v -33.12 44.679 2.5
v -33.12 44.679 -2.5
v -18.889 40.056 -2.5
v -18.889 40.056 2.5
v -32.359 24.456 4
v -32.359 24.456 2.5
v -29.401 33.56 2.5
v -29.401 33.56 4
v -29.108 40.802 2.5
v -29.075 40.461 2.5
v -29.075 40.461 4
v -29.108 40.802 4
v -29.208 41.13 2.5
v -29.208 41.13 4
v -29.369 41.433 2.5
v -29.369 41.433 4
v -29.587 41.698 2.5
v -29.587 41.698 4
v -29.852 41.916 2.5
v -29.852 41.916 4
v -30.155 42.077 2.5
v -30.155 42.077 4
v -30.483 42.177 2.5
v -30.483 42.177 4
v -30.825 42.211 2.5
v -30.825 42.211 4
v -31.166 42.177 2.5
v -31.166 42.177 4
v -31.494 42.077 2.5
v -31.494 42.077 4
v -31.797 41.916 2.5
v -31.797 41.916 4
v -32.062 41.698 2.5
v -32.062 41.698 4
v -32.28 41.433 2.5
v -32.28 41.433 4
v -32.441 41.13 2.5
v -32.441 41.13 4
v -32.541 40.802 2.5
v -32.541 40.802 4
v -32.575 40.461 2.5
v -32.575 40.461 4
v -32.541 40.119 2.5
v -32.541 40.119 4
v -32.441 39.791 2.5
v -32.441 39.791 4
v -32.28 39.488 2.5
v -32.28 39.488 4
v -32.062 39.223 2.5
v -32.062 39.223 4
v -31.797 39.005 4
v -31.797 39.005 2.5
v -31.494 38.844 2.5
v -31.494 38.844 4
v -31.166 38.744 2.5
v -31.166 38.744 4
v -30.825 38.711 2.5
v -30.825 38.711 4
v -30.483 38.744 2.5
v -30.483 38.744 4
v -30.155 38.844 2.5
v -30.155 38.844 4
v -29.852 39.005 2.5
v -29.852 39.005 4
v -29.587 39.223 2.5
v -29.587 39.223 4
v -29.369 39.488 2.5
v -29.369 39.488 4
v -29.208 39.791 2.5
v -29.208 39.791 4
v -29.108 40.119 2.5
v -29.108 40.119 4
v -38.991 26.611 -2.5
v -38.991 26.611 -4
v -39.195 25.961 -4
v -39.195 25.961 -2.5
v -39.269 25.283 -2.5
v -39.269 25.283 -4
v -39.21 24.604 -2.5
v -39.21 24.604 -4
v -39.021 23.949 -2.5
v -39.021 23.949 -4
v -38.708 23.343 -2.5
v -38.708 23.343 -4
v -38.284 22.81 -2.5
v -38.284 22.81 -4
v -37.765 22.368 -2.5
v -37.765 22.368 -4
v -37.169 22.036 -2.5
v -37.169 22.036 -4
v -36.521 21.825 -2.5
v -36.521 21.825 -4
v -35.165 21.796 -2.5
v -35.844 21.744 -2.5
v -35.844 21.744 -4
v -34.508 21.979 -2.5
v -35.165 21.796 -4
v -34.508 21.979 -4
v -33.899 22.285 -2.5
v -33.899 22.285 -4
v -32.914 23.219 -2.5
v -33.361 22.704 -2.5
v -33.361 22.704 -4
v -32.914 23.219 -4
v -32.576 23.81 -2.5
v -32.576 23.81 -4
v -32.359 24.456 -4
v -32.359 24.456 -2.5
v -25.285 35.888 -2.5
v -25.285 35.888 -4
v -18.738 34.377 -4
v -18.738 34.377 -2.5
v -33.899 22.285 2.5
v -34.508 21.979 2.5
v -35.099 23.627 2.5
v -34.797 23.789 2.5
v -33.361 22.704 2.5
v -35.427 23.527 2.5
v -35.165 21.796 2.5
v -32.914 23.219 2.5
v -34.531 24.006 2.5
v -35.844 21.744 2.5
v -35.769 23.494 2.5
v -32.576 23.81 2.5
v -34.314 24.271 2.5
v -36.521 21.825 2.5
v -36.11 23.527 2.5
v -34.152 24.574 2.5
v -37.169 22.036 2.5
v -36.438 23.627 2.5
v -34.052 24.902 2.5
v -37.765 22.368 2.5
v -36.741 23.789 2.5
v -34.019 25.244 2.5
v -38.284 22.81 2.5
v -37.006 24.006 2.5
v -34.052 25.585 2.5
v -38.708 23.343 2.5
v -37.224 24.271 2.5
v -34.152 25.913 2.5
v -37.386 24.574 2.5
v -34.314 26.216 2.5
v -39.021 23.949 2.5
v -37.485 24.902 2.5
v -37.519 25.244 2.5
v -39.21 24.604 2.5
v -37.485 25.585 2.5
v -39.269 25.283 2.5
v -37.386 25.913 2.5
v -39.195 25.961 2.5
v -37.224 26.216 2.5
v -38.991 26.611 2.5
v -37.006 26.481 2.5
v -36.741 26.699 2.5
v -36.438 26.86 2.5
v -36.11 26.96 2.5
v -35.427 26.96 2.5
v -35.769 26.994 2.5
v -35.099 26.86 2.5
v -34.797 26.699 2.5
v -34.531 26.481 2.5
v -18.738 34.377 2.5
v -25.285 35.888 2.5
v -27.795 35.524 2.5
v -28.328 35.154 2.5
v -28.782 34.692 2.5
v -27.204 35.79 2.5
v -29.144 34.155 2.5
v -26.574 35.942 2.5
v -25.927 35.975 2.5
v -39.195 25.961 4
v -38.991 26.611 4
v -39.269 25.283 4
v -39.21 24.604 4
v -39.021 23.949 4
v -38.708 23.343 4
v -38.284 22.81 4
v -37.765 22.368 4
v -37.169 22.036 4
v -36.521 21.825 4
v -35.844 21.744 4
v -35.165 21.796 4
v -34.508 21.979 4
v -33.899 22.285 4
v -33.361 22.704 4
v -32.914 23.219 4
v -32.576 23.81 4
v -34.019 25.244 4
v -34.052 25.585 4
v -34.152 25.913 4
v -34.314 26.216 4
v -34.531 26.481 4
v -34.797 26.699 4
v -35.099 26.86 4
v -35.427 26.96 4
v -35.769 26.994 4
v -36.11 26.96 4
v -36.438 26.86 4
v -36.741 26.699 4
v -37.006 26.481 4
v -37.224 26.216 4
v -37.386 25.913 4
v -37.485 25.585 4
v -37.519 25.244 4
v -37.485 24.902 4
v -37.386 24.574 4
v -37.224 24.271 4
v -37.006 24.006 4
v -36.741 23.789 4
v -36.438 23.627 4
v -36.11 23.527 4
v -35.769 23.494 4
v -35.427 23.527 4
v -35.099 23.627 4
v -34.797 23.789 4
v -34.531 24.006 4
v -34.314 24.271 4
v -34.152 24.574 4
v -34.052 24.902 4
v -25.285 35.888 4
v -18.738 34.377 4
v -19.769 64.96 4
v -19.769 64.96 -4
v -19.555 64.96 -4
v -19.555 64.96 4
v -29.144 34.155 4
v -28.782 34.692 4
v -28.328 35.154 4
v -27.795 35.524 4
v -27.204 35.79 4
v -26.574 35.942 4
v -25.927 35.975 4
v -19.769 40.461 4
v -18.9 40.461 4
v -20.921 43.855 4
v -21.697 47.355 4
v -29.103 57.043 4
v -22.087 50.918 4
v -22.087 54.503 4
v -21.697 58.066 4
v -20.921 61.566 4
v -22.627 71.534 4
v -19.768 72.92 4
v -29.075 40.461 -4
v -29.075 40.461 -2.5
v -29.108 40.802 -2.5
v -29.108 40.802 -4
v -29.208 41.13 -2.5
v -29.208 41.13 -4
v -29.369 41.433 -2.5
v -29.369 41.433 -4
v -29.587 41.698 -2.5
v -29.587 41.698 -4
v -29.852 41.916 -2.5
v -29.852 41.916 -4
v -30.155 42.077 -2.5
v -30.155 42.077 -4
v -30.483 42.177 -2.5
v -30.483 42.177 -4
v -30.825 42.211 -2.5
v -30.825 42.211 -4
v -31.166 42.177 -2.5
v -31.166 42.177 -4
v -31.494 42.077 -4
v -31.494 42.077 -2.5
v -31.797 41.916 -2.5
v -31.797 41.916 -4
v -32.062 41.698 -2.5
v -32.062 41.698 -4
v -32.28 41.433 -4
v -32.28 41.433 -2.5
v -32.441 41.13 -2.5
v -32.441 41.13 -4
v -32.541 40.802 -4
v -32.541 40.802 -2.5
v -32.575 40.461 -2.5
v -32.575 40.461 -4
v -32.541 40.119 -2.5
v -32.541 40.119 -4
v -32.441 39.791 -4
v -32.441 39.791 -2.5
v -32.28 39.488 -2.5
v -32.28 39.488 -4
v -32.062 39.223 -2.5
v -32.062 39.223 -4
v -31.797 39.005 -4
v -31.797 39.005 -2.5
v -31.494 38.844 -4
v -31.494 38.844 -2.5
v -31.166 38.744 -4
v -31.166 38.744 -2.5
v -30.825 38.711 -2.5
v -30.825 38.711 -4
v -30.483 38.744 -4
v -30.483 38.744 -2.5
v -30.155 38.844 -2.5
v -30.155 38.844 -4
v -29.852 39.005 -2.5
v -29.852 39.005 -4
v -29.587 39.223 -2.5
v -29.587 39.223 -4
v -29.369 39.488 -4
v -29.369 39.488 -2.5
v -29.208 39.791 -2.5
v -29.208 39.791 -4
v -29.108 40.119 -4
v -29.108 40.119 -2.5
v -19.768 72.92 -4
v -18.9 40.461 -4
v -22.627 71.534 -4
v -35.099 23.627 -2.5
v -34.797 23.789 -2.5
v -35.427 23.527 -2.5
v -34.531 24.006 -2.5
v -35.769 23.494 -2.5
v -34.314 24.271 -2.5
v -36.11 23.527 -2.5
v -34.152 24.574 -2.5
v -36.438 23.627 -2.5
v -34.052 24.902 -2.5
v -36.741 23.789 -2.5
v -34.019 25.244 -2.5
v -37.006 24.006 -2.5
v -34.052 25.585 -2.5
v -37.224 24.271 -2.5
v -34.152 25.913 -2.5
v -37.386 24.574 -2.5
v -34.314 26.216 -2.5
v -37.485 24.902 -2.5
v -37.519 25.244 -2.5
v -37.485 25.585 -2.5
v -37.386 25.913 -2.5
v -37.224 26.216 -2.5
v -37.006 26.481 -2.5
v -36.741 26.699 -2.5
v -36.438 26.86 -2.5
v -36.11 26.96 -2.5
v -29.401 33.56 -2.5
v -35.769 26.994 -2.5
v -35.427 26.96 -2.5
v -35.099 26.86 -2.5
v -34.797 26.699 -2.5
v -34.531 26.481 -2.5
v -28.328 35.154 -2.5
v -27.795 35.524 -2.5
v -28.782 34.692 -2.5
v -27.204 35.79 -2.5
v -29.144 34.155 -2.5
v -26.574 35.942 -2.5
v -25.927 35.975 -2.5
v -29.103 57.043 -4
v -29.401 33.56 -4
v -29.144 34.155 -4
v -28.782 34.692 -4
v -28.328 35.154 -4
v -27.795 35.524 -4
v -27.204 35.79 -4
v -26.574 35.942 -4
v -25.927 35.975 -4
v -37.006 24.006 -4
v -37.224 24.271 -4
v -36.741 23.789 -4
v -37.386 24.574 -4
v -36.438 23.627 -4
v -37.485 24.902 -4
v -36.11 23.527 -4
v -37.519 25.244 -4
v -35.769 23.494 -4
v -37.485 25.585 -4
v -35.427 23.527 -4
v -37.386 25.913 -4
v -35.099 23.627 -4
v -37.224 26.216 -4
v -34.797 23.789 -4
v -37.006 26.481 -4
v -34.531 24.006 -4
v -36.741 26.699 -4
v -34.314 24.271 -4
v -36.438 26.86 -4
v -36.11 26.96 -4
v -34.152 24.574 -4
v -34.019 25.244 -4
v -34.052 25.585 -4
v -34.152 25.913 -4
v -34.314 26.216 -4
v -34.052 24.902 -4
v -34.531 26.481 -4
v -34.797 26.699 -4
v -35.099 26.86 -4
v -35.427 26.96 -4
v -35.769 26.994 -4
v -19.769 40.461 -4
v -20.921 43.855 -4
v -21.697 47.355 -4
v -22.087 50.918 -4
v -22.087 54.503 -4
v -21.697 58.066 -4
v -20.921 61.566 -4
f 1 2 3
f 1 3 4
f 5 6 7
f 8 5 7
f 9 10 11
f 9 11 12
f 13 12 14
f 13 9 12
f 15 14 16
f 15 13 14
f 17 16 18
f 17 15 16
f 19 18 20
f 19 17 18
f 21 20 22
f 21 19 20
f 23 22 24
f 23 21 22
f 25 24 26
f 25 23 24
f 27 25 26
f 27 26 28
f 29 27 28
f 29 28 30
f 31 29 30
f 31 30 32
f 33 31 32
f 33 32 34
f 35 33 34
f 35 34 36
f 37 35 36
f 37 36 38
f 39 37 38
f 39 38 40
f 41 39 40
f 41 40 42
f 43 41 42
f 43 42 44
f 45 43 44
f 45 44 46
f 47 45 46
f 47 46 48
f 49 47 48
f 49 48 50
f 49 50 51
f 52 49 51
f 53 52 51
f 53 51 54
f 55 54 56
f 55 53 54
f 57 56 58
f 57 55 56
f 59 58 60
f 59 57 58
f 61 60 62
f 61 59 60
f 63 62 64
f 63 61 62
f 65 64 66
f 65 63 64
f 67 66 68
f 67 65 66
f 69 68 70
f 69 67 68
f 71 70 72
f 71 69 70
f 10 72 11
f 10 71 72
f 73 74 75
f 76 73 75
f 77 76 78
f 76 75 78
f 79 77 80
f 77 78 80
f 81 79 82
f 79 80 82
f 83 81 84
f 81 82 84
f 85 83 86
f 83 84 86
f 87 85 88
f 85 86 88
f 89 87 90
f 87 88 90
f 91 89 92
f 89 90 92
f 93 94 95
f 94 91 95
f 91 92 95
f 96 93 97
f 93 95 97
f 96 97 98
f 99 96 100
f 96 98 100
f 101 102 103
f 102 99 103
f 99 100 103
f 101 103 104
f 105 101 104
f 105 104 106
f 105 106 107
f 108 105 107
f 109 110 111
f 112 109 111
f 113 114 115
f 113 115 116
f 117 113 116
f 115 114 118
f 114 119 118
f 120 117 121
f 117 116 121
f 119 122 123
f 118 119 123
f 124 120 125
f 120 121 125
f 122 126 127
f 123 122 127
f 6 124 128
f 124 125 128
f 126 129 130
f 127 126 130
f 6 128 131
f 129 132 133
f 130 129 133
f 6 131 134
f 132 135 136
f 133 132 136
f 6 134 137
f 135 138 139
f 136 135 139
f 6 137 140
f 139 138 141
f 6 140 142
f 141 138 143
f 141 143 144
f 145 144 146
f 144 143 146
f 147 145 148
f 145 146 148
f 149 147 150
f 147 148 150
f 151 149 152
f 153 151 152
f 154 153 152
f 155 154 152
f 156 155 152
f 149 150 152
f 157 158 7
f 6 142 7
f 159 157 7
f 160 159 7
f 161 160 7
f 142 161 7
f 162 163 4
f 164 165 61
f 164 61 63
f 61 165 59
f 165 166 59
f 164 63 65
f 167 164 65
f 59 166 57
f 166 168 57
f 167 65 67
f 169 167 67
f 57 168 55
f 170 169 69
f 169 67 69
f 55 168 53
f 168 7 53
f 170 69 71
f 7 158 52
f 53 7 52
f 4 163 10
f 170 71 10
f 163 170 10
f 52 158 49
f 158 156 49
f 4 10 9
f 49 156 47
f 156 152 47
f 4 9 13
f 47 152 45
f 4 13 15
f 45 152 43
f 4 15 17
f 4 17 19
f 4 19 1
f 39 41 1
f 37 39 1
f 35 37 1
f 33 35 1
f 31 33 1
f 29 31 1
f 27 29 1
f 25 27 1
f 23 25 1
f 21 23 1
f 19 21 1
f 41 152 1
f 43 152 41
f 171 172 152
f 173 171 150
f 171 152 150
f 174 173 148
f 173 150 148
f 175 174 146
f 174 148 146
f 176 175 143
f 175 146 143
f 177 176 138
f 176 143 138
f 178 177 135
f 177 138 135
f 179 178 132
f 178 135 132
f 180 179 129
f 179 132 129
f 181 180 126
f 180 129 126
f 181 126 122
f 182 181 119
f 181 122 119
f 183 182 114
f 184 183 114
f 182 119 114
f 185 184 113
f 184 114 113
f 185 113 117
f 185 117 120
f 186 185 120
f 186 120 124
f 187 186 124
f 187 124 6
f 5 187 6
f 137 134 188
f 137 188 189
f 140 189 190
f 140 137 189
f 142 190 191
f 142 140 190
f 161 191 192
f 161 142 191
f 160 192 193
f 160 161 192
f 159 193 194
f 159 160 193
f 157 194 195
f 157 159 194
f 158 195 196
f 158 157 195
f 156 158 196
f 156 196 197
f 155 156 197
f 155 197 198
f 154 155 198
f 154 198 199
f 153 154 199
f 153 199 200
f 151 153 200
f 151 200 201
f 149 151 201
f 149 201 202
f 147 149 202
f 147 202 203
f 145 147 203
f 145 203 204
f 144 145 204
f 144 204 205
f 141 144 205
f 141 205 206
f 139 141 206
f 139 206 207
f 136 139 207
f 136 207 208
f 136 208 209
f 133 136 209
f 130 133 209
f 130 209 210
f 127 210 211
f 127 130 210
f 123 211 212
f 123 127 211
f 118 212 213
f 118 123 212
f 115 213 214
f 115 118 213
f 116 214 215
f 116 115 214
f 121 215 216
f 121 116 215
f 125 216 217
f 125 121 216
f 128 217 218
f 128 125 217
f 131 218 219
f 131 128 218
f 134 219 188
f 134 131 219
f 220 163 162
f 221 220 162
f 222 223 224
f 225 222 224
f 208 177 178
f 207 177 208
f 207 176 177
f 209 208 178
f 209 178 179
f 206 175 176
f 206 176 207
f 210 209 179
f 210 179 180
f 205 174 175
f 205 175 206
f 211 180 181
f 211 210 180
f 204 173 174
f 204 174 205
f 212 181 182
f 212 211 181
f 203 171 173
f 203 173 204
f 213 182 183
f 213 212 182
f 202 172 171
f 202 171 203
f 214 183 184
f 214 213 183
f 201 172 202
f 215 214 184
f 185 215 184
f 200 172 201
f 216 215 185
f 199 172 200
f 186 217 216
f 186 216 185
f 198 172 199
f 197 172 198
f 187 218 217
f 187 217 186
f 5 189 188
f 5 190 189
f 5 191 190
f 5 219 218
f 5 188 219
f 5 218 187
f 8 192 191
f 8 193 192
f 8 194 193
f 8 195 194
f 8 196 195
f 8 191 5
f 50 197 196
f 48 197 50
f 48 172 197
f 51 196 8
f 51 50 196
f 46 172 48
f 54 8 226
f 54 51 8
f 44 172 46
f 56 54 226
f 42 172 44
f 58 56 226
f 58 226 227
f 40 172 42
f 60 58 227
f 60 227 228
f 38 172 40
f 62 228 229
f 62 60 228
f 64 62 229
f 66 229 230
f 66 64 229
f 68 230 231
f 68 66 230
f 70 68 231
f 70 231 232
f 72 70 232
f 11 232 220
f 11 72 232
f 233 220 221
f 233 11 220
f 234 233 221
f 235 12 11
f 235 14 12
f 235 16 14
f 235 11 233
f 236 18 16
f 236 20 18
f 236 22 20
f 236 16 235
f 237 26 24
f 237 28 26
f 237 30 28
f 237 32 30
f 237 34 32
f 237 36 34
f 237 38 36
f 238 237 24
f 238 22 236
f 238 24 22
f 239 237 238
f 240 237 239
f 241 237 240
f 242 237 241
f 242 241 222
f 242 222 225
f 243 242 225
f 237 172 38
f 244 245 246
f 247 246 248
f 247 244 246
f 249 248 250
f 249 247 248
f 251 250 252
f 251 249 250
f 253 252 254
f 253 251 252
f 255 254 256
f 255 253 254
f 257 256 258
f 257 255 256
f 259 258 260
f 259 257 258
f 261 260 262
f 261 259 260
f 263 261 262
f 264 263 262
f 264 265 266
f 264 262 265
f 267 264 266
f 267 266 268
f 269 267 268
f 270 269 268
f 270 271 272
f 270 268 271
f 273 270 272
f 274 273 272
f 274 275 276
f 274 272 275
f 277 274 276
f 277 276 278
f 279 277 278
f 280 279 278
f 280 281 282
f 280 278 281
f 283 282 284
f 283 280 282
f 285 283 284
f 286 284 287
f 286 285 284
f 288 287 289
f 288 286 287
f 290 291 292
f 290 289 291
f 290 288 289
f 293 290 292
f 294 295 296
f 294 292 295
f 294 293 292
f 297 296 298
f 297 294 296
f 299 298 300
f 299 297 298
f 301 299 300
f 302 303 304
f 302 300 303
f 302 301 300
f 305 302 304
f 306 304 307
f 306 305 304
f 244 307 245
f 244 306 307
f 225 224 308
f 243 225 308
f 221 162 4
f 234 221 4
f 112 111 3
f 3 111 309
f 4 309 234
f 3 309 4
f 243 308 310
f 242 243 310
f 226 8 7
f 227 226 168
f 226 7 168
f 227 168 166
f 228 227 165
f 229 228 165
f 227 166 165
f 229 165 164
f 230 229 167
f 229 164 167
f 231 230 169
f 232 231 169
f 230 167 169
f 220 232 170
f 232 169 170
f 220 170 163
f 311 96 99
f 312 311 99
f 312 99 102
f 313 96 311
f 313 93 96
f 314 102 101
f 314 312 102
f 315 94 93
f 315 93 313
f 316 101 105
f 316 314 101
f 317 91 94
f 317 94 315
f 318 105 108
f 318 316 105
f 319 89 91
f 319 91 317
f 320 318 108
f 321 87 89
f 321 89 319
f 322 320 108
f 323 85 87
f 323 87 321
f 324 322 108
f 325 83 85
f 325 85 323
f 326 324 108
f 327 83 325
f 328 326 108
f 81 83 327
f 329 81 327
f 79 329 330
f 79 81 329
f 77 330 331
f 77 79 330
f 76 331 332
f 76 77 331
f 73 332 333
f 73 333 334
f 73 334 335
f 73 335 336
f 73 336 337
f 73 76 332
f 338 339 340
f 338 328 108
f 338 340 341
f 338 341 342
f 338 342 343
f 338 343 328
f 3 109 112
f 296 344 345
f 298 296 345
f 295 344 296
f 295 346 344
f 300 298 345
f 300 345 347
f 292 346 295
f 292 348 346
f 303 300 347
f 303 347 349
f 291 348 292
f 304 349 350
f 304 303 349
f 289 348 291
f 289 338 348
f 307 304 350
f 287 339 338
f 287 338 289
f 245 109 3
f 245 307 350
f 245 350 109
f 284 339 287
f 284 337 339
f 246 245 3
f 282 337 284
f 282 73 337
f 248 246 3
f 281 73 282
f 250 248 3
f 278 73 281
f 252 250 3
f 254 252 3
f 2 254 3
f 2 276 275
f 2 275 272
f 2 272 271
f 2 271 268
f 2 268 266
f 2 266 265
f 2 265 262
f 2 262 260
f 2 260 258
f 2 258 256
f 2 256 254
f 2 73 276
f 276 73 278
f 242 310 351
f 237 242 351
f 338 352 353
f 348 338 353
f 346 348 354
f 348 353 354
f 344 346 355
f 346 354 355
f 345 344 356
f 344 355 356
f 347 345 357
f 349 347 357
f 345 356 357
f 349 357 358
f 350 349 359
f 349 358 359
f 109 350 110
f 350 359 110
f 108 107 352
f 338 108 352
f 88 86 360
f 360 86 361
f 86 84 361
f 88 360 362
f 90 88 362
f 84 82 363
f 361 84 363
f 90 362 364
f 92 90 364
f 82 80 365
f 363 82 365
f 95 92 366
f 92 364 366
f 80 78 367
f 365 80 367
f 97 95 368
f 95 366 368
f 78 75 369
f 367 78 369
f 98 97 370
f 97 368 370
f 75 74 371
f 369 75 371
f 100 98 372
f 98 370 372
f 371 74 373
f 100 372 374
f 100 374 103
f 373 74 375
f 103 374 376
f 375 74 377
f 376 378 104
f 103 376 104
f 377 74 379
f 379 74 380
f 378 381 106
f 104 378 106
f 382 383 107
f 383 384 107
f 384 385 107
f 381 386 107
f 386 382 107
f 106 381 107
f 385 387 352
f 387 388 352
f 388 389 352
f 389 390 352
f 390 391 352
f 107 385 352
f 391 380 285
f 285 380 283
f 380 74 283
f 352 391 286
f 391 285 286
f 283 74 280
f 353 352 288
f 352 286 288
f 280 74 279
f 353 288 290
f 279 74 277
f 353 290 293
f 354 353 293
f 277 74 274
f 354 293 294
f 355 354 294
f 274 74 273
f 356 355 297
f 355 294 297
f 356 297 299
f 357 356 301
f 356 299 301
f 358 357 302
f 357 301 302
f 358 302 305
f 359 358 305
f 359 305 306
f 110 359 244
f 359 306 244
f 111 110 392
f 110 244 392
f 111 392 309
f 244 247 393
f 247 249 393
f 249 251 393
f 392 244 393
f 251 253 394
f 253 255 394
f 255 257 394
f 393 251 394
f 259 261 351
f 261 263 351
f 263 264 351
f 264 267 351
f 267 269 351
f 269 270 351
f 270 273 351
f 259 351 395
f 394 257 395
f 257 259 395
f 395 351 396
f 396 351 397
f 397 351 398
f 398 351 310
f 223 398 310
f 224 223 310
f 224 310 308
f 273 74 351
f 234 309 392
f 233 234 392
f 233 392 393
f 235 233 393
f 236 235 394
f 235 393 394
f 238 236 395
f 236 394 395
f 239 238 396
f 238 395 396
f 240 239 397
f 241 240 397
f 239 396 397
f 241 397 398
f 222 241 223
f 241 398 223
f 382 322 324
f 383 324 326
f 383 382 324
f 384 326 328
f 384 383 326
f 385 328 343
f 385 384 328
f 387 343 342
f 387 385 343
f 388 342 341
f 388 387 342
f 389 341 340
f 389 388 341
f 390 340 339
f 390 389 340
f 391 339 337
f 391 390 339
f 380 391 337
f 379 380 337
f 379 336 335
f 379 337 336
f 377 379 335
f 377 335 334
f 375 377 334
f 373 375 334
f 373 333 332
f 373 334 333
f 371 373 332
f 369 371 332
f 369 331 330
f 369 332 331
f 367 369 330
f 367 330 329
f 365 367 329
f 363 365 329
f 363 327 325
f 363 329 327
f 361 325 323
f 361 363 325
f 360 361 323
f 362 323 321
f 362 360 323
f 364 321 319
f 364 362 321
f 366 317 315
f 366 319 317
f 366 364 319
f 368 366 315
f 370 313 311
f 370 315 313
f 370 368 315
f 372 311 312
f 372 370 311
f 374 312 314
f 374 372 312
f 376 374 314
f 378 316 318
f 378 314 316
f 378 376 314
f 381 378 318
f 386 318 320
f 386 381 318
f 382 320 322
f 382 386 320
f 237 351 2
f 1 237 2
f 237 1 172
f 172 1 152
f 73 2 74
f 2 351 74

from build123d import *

# Parameters (mm, degrees)
ESTRUSIONE_ESTRUSIONE1_START     = -4
ESTRUSIONE_ESTRUSIONE1_OUTLINE_R = 1.75
ESTRUSIONE_ESTRUSIONE1_DEPTH     = 8
SCHIZZO2_W                       = 5
SCHIZZO2_H                       = 30
TAGLIO_ESTRUSIONE1_DEPTH         = 15


# Read off the part's stored shape, not the designer's step: Estrusione-Estrusione1
with BuildPart() as part:
    # Estrusione-Estrusione1 outline → Estrusione-Estrusione1 (new body)
    with BuildSketch(Plane.XY.offset(ESTRUSIONE_ESTRUSIONE1_START)):
        with BuildLine():
            Line((-25.284658439, 35.888314388), (-18.737560358, 34.376797697))
            Line((-18.737560358, 34.376797697), (-18.90016625, 40.460566904))
            Line((-18.90016625, 40.460566904), (-19.768803662, 40.460566904))
            ThreePointArc((-19.768803662, 40.460566904), (-22.136039573, 52.710253398), (-19.768803662, 64.959939892))
            Line((-19.768803662, 64.959939892), (-19.554981097, 64.959939892))
            Line((-19.554981097, 64.959939892), (-19.767739779, 72.920135539))
            Line((-19.767739779, 72.920135539), (-22.627052267, 71.534084223))
            Line((-22.627052267, 71.534084223), (-29.102672814, 57.04304198))
            Line((-29.102672814, 57.04304198), (-38.990570649, 26.611221593))
            ThreePointArc((-38.990570649, 26.611221593), (-36.850363143, 21.914964836), (-32.358508436, 24.456333953))
            Line((-32.358508436, 24.456333953), (-29.400684937, 33.559578642))
            ThreePointArc((-29.400684937, 33.559578642), (-27.79546959, 35.524264097), (-25.284658439, 35.888314388))
        make_face()
        with Locations((-35.768803662, 25.243662643)):
            Circle(ESTRUSIONE_ESTRUSIONE1_OUTLINE_R, mode=Mode.SUBTRACT)
        with Locations((-30.824531752, 40.460566904)):
            Circle(ESTRUSIONE_ESTRUSIONE1_OUTLINE_R, mode=Mode.SUBTRACT)
    extrude(amount=ESTRUSIONE_ESTRUSIONE1_DEPTH)

    # Schizzo2 → Taglio-Estrusione1 (cut, symmetric)
    with BuildSketch(Plane(origin=(-39.772113155, 12.922742925, 0), x_dir=(0, 0, 1), z_dir=(-0.9510565162951534, 0.3090169943749484, 0))):
        with Locations((0, 17.257936303)):
            Rectangle(SCHIZZO2_W, SCHIZZO2_H)
    extrude(amount=TAGLIO_ESTRUSIONE1_DEPTH, both=True, mode=Mode.SUBTRACT)


solid = part.part
